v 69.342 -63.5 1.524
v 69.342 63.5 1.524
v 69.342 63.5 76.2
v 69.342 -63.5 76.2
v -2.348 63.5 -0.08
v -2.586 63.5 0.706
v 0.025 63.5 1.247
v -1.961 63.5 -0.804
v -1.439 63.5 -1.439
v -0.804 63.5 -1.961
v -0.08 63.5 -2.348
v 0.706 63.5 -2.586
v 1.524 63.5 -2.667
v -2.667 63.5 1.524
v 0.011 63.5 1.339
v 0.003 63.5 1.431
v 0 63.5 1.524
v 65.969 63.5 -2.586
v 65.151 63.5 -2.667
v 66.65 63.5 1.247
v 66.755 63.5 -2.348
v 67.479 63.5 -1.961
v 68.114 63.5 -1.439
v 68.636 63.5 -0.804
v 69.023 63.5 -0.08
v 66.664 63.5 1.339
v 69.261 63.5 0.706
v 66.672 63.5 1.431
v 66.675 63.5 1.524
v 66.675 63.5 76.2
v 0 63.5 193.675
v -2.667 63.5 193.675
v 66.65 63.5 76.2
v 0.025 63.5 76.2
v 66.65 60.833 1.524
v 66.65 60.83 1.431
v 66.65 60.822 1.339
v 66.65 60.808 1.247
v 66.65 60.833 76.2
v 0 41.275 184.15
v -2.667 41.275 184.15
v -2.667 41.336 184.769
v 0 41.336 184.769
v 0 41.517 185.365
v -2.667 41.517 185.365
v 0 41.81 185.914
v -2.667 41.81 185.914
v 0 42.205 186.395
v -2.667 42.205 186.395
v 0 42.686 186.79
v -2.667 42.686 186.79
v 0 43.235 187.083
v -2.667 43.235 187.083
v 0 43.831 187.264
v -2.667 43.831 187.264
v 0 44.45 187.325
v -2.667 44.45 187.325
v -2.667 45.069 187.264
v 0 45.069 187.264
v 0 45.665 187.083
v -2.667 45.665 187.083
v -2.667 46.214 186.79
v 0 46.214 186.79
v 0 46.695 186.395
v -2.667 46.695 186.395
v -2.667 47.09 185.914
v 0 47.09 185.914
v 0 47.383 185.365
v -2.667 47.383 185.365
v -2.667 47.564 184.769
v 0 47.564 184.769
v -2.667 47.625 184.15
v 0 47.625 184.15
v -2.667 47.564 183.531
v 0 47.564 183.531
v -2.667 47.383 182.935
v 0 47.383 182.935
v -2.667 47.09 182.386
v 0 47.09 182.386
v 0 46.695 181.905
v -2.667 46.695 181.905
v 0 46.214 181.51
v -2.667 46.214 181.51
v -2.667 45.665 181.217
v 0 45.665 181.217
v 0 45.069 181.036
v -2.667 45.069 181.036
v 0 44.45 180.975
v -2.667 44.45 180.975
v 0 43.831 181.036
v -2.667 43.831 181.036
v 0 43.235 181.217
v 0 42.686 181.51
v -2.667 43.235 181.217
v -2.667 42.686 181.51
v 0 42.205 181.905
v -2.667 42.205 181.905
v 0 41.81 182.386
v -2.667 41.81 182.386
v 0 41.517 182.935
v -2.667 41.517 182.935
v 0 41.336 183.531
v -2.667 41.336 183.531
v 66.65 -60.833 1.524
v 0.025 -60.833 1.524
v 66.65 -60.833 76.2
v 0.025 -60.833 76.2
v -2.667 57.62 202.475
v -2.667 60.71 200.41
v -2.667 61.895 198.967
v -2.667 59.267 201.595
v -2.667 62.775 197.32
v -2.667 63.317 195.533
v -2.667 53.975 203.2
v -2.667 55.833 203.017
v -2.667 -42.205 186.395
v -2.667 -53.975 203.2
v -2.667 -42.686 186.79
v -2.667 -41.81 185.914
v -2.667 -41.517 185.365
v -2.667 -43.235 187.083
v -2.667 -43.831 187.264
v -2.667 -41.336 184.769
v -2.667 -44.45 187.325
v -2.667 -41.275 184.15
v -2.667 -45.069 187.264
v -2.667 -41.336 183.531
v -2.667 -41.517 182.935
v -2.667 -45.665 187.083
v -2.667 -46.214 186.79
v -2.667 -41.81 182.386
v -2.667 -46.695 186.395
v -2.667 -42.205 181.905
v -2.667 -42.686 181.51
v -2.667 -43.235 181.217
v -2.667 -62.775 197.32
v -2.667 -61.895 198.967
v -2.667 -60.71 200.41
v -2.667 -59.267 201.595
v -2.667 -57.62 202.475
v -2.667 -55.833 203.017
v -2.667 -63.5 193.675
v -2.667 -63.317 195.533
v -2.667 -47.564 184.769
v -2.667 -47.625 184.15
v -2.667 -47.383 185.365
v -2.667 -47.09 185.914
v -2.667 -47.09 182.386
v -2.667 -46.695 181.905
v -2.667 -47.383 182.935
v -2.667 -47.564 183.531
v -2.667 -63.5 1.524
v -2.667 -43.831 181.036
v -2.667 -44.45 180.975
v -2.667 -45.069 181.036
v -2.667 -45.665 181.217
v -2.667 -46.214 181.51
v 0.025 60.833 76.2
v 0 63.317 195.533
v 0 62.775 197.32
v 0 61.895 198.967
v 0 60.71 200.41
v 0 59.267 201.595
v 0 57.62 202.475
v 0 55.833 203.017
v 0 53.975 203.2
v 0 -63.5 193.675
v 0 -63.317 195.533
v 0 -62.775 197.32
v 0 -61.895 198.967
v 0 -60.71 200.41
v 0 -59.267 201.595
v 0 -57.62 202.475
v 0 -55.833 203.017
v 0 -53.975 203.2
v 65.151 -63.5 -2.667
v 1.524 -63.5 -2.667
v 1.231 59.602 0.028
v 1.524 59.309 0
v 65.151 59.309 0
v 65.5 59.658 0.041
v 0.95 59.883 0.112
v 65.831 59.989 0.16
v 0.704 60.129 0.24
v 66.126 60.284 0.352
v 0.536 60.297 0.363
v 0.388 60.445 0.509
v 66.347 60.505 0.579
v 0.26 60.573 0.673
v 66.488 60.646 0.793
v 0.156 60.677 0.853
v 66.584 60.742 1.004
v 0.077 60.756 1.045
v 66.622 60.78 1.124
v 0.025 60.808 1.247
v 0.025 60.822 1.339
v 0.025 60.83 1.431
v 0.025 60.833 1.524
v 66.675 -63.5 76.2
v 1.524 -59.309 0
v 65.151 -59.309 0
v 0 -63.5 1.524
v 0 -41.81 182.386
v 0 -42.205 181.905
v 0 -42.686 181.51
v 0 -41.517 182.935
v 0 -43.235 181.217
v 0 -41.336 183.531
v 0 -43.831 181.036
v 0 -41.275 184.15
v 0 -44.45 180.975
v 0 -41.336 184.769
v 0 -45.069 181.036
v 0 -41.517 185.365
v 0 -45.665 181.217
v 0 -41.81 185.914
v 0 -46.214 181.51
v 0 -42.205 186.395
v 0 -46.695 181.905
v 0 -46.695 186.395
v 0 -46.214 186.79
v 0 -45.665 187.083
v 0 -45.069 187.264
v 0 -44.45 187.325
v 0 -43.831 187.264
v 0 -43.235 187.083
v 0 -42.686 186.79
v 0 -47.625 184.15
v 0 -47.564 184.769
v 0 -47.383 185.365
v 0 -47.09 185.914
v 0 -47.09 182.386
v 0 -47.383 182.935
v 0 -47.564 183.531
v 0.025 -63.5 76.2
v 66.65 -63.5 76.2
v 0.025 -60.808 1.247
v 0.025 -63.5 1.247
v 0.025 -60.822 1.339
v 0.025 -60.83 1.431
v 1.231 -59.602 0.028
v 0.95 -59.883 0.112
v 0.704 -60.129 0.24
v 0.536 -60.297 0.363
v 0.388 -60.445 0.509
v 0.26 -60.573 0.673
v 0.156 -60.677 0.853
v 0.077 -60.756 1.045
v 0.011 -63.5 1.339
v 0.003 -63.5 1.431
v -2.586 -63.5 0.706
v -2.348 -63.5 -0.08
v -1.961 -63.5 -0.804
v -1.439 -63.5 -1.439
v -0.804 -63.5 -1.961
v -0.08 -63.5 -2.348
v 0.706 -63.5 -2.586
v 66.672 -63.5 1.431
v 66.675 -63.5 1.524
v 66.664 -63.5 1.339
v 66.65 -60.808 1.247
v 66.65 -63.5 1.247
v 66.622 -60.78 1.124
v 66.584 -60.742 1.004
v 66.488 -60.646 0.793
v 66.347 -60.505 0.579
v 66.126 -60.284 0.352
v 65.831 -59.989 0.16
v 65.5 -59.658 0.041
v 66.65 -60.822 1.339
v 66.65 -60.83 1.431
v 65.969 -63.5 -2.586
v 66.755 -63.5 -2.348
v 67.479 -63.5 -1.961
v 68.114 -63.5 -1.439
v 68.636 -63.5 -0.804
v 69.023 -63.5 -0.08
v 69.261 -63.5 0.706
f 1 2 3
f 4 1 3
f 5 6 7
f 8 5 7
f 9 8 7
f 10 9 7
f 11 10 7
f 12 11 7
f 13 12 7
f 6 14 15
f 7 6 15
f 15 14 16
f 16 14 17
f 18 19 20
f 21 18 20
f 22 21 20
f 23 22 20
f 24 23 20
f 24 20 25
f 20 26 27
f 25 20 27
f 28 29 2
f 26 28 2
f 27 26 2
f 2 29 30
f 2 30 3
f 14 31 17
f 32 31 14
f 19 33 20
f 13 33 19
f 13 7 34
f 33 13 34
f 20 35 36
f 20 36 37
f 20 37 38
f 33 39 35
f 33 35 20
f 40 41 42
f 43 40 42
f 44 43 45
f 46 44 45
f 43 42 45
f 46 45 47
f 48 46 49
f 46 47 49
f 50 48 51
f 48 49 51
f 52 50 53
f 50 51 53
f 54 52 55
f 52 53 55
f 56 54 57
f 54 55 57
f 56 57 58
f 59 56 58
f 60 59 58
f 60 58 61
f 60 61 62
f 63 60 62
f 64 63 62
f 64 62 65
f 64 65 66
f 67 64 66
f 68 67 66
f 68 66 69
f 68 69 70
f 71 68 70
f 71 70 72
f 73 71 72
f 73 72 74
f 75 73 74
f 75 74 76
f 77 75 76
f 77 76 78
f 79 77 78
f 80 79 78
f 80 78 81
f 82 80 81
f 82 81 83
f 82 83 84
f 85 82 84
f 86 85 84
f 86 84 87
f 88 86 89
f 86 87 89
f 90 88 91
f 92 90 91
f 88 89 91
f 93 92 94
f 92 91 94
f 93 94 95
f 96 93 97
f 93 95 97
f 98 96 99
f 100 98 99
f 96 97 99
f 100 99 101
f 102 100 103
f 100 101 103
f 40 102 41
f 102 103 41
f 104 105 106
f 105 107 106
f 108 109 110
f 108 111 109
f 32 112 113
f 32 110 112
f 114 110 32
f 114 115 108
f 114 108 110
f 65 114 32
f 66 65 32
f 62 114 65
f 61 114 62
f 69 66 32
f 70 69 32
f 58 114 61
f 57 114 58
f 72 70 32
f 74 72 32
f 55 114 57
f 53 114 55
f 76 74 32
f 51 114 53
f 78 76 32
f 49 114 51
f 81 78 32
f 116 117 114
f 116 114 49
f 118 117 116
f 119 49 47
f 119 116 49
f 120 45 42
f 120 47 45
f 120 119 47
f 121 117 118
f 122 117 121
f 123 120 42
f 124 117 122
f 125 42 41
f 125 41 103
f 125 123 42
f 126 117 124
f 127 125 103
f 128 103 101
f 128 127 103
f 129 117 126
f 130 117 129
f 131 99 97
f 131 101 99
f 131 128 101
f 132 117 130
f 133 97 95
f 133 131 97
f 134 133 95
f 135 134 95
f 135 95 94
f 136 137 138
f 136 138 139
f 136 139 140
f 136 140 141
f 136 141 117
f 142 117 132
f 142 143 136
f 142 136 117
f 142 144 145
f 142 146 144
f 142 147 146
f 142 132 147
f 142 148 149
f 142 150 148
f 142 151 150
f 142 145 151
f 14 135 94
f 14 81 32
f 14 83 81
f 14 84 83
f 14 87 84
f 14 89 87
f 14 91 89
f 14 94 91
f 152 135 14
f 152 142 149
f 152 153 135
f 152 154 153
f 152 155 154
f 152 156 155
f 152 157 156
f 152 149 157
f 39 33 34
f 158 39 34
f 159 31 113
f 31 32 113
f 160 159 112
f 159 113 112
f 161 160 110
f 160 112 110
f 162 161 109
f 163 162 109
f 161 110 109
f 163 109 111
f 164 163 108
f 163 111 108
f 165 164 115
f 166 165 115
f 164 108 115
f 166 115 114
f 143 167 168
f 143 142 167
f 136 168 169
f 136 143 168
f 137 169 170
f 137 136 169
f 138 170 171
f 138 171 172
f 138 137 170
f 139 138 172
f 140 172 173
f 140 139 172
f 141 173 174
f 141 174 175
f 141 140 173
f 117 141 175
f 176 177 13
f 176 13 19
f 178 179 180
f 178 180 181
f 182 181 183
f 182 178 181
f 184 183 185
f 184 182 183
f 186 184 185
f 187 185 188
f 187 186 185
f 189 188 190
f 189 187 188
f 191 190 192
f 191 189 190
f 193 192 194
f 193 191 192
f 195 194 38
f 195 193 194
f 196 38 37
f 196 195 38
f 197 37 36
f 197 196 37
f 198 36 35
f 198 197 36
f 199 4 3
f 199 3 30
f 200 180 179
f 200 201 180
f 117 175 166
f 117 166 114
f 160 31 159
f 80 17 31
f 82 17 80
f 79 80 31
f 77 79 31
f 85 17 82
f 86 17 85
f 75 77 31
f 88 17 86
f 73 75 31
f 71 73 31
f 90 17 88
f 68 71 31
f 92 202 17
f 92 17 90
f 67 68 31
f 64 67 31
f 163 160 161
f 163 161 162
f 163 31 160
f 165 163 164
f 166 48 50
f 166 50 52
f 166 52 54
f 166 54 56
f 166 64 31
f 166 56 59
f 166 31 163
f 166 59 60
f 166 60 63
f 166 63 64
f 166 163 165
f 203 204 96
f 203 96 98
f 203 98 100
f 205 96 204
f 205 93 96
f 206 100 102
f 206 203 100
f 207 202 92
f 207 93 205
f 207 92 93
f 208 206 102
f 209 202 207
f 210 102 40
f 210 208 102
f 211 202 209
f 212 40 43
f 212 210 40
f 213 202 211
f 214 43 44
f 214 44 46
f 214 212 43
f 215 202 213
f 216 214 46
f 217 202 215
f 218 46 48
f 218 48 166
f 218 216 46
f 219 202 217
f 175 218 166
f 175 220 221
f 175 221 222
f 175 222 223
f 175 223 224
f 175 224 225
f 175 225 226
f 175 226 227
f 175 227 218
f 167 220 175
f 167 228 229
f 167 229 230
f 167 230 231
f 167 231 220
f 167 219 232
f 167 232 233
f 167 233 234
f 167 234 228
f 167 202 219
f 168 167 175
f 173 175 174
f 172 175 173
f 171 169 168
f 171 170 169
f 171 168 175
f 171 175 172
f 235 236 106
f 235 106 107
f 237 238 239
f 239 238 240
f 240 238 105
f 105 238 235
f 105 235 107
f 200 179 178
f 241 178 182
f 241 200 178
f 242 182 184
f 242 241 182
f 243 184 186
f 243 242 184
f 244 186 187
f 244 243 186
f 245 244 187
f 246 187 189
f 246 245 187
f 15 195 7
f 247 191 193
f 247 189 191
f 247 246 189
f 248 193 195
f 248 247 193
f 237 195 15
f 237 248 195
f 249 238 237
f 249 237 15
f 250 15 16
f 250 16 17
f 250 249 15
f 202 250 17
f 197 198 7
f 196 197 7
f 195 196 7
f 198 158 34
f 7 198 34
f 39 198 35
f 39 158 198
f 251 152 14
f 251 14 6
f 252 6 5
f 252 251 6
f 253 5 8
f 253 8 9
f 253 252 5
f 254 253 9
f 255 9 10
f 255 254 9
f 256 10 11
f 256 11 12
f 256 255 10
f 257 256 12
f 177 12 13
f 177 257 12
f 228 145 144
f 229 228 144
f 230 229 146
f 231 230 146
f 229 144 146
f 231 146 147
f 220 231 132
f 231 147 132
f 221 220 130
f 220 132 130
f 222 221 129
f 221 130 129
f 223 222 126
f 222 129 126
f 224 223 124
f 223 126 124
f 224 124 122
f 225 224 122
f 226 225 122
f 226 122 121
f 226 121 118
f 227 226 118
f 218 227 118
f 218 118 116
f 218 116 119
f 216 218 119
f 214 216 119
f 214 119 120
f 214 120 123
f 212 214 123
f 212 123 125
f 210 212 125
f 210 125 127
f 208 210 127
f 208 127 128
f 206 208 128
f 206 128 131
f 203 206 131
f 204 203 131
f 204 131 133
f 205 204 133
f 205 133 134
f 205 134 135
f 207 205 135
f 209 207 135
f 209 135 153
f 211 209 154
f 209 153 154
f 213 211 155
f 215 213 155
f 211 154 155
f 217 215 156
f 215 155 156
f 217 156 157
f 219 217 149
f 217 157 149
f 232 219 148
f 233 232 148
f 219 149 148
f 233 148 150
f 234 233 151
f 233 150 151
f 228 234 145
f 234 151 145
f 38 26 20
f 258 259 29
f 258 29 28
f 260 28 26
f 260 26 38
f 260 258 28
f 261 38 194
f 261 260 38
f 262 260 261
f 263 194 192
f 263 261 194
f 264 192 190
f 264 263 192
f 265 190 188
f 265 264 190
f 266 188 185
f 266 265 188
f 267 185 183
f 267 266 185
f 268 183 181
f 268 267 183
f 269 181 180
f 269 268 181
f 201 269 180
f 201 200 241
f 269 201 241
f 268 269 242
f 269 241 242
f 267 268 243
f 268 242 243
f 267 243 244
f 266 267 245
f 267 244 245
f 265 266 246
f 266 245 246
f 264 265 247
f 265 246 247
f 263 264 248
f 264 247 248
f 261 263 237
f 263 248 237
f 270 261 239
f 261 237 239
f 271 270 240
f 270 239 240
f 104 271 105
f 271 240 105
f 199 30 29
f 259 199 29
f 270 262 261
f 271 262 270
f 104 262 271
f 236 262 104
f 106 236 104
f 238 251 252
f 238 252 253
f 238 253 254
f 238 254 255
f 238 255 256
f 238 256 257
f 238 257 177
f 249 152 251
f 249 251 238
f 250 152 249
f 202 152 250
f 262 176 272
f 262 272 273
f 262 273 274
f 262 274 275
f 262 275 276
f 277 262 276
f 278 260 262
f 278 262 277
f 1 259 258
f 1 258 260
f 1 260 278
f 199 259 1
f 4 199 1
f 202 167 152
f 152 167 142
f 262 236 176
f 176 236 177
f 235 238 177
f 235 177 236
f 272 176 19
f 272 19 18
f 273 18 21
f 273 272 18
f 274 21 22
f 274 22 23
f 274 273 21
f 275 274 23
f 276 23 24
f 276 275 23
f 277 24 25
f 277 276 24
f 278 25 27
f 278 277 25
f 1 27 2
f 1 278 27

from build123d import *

# Parameters (mm, degrees)
F1_DEPTH    = 63.5
F3_DEPTH    = 2.667
F5_T4_DEPTH = 71.247
F6_T4_DEPTH = 71.247
F8_D        = 6.35
F9_R        = 9.525


# Not quite as in the source:
# - a fillet or chamfer that OpenCascade refuses, or shapes differently, is made with other operations: its cross-section is extruded or revolved along the edge and cut away or added
# - a feature of the source that left no trace in its solid (it failed there, or was rolled back) is left out


with BuildPart() as f1:
    # F0 (on Front) → F1 (new body, symmetric)
    with BuildSketch(Plane.XZ):
        with BuildLine():
            Line((65.151, 0), (1.524, 0))
            ThreePointArc((1.524, 0), (0.4463692655, 0.4463692655), (0, 1.524))
            Line((0, 1.524), (0, 76.2))
            Line((0, 76.2), (0, 203.2))
            Line((0, 203.2), (-2.667, 203.2))
            Line((-2.667, 203.2), (-2.667, 76.2))
            Line((-2.667, 76.2), (-2.667, 1.524))
            ThreePointArc((-2.667, 1.524), (-1.43948452, -1.43948452), (1.524, -2.667))
            Line((1.524, -2.667), (65.151, -2.667))
            ThreePointArc((65.151, -2.667), (68.11448452, -1.43948452), (69.342, 1.524))
            Line((69.342, 1.524), (69.342, 76.2))
            Line((69.342, 76.2), (66.675, 76.2))
            Line((66.675, 76.2), (66.675, 1.524))
            ThreePointArc((66.675, 1.524), (66.2286307345, 0.4463692655), (65.151, 0))
        make_face()
    extrude(amount=F1_DEPTH, both=True)

    # F2 (on face) → F3 (join)
    with BuildSketch(Plane.XZ.offset(63.5)):
        with BuildLine():
            Line((66.6496, -1.143), (66.6496, 76.2))
            Line((66.6496, 76.2), (0.0254, 76.2))
            Line((0.0254, 76.2), (0.0254, -1.143))
            ThreePointArc((0.0254, -1.143), (0.4717692655, -2.2206307345), (1.5494, -2.667))
            Line((1.5494, -2.667), (65.1256, -2.667))
            ThreePointArc((65.1256, -2.667), (66.2032307345, -2.2206307345), (66.6496, -1.143))
        make_face()
    extrude(amount=-F3_DEPTH)

    # F4: F1 across plane


with BuildPart() as f1_1:
    add(f1.part)
    add(f1.part.mirror(Plane.XZ))

    # F5: fillet of radius 1.524 on 1 edges, made by hand


with BuildPart() as f5_tool2:
    # F5_s3 → F5_t4 (new body)
    with BuildSketch(Plane.YZ.offset(-2.286)):
        with BuildLine():
            ThreePointArc((-59.309, 0), (-60.3866307345, 0.4463692655), (-60.833, 1.524))
            Line((-60.833, 1.524), (-60.833, 0))
            Line((-60.833, 0), (-59.309, 0))
        make_face()
    extrude(amount=F5_T4_DEPTH)

    split(bisect_by=Plane.YZ.offset(0.0254), keep=Keep.TOP)

    split(bisect_by=Plane.YZ.offset(66.6496), keep=Keep.BOTTOM)


with BuildPart() as f1_2:
    add(f1_1.part)

    # F5_t1: union F5_tool2
    add(f5_tool2.part)

    # F6: fillet of radius 1.524 on 1 edges, made by hand


with BuildPart() as f6_tool2:
    # F6_s3 → F6_t4 (new body)
    with BuildSketch(Plane.YZ.offset(-2.286)):
        with BuildLine():
            ThreePointArc((59.309, 0), (60.3866307345, 0.4463692655), (60.833, 1.524))
            Line((60.833, 1.524), (60.833, 0))
            Line((60.833, 0), (59.309, 0))
        make_face()
    extrude(amount=F6_T4_DEPTH)

    split(bisect_by=Plane.YZ.offset(0.0254), keep=Keep.TOP)

    split(bisect_by=Plane.YZ.offset(66.6496), keep=Keep.BOTTOM)


with BuildPart() as f1_3:
    add(f1_2.part)

    # F6_t1: union F6_tool2
    add(f6_tool2.part)

    # F8 (through all)
    with Locations(Plane.YZ):
        with Locations((-44.45, 184.15), (44.45, 184.15)):
            Hole(F8_D / 2)

    # F9
    f9_edges = [f1_3.edges().sort_by_distance(p)[0] for p in [
        (-1.3335, -63.5, 203.2),
        (-1.3335, 63.5, 203.2),
    ]]
    fillet(f9_edges, radius=F9_R)


solid = f1_3.part
